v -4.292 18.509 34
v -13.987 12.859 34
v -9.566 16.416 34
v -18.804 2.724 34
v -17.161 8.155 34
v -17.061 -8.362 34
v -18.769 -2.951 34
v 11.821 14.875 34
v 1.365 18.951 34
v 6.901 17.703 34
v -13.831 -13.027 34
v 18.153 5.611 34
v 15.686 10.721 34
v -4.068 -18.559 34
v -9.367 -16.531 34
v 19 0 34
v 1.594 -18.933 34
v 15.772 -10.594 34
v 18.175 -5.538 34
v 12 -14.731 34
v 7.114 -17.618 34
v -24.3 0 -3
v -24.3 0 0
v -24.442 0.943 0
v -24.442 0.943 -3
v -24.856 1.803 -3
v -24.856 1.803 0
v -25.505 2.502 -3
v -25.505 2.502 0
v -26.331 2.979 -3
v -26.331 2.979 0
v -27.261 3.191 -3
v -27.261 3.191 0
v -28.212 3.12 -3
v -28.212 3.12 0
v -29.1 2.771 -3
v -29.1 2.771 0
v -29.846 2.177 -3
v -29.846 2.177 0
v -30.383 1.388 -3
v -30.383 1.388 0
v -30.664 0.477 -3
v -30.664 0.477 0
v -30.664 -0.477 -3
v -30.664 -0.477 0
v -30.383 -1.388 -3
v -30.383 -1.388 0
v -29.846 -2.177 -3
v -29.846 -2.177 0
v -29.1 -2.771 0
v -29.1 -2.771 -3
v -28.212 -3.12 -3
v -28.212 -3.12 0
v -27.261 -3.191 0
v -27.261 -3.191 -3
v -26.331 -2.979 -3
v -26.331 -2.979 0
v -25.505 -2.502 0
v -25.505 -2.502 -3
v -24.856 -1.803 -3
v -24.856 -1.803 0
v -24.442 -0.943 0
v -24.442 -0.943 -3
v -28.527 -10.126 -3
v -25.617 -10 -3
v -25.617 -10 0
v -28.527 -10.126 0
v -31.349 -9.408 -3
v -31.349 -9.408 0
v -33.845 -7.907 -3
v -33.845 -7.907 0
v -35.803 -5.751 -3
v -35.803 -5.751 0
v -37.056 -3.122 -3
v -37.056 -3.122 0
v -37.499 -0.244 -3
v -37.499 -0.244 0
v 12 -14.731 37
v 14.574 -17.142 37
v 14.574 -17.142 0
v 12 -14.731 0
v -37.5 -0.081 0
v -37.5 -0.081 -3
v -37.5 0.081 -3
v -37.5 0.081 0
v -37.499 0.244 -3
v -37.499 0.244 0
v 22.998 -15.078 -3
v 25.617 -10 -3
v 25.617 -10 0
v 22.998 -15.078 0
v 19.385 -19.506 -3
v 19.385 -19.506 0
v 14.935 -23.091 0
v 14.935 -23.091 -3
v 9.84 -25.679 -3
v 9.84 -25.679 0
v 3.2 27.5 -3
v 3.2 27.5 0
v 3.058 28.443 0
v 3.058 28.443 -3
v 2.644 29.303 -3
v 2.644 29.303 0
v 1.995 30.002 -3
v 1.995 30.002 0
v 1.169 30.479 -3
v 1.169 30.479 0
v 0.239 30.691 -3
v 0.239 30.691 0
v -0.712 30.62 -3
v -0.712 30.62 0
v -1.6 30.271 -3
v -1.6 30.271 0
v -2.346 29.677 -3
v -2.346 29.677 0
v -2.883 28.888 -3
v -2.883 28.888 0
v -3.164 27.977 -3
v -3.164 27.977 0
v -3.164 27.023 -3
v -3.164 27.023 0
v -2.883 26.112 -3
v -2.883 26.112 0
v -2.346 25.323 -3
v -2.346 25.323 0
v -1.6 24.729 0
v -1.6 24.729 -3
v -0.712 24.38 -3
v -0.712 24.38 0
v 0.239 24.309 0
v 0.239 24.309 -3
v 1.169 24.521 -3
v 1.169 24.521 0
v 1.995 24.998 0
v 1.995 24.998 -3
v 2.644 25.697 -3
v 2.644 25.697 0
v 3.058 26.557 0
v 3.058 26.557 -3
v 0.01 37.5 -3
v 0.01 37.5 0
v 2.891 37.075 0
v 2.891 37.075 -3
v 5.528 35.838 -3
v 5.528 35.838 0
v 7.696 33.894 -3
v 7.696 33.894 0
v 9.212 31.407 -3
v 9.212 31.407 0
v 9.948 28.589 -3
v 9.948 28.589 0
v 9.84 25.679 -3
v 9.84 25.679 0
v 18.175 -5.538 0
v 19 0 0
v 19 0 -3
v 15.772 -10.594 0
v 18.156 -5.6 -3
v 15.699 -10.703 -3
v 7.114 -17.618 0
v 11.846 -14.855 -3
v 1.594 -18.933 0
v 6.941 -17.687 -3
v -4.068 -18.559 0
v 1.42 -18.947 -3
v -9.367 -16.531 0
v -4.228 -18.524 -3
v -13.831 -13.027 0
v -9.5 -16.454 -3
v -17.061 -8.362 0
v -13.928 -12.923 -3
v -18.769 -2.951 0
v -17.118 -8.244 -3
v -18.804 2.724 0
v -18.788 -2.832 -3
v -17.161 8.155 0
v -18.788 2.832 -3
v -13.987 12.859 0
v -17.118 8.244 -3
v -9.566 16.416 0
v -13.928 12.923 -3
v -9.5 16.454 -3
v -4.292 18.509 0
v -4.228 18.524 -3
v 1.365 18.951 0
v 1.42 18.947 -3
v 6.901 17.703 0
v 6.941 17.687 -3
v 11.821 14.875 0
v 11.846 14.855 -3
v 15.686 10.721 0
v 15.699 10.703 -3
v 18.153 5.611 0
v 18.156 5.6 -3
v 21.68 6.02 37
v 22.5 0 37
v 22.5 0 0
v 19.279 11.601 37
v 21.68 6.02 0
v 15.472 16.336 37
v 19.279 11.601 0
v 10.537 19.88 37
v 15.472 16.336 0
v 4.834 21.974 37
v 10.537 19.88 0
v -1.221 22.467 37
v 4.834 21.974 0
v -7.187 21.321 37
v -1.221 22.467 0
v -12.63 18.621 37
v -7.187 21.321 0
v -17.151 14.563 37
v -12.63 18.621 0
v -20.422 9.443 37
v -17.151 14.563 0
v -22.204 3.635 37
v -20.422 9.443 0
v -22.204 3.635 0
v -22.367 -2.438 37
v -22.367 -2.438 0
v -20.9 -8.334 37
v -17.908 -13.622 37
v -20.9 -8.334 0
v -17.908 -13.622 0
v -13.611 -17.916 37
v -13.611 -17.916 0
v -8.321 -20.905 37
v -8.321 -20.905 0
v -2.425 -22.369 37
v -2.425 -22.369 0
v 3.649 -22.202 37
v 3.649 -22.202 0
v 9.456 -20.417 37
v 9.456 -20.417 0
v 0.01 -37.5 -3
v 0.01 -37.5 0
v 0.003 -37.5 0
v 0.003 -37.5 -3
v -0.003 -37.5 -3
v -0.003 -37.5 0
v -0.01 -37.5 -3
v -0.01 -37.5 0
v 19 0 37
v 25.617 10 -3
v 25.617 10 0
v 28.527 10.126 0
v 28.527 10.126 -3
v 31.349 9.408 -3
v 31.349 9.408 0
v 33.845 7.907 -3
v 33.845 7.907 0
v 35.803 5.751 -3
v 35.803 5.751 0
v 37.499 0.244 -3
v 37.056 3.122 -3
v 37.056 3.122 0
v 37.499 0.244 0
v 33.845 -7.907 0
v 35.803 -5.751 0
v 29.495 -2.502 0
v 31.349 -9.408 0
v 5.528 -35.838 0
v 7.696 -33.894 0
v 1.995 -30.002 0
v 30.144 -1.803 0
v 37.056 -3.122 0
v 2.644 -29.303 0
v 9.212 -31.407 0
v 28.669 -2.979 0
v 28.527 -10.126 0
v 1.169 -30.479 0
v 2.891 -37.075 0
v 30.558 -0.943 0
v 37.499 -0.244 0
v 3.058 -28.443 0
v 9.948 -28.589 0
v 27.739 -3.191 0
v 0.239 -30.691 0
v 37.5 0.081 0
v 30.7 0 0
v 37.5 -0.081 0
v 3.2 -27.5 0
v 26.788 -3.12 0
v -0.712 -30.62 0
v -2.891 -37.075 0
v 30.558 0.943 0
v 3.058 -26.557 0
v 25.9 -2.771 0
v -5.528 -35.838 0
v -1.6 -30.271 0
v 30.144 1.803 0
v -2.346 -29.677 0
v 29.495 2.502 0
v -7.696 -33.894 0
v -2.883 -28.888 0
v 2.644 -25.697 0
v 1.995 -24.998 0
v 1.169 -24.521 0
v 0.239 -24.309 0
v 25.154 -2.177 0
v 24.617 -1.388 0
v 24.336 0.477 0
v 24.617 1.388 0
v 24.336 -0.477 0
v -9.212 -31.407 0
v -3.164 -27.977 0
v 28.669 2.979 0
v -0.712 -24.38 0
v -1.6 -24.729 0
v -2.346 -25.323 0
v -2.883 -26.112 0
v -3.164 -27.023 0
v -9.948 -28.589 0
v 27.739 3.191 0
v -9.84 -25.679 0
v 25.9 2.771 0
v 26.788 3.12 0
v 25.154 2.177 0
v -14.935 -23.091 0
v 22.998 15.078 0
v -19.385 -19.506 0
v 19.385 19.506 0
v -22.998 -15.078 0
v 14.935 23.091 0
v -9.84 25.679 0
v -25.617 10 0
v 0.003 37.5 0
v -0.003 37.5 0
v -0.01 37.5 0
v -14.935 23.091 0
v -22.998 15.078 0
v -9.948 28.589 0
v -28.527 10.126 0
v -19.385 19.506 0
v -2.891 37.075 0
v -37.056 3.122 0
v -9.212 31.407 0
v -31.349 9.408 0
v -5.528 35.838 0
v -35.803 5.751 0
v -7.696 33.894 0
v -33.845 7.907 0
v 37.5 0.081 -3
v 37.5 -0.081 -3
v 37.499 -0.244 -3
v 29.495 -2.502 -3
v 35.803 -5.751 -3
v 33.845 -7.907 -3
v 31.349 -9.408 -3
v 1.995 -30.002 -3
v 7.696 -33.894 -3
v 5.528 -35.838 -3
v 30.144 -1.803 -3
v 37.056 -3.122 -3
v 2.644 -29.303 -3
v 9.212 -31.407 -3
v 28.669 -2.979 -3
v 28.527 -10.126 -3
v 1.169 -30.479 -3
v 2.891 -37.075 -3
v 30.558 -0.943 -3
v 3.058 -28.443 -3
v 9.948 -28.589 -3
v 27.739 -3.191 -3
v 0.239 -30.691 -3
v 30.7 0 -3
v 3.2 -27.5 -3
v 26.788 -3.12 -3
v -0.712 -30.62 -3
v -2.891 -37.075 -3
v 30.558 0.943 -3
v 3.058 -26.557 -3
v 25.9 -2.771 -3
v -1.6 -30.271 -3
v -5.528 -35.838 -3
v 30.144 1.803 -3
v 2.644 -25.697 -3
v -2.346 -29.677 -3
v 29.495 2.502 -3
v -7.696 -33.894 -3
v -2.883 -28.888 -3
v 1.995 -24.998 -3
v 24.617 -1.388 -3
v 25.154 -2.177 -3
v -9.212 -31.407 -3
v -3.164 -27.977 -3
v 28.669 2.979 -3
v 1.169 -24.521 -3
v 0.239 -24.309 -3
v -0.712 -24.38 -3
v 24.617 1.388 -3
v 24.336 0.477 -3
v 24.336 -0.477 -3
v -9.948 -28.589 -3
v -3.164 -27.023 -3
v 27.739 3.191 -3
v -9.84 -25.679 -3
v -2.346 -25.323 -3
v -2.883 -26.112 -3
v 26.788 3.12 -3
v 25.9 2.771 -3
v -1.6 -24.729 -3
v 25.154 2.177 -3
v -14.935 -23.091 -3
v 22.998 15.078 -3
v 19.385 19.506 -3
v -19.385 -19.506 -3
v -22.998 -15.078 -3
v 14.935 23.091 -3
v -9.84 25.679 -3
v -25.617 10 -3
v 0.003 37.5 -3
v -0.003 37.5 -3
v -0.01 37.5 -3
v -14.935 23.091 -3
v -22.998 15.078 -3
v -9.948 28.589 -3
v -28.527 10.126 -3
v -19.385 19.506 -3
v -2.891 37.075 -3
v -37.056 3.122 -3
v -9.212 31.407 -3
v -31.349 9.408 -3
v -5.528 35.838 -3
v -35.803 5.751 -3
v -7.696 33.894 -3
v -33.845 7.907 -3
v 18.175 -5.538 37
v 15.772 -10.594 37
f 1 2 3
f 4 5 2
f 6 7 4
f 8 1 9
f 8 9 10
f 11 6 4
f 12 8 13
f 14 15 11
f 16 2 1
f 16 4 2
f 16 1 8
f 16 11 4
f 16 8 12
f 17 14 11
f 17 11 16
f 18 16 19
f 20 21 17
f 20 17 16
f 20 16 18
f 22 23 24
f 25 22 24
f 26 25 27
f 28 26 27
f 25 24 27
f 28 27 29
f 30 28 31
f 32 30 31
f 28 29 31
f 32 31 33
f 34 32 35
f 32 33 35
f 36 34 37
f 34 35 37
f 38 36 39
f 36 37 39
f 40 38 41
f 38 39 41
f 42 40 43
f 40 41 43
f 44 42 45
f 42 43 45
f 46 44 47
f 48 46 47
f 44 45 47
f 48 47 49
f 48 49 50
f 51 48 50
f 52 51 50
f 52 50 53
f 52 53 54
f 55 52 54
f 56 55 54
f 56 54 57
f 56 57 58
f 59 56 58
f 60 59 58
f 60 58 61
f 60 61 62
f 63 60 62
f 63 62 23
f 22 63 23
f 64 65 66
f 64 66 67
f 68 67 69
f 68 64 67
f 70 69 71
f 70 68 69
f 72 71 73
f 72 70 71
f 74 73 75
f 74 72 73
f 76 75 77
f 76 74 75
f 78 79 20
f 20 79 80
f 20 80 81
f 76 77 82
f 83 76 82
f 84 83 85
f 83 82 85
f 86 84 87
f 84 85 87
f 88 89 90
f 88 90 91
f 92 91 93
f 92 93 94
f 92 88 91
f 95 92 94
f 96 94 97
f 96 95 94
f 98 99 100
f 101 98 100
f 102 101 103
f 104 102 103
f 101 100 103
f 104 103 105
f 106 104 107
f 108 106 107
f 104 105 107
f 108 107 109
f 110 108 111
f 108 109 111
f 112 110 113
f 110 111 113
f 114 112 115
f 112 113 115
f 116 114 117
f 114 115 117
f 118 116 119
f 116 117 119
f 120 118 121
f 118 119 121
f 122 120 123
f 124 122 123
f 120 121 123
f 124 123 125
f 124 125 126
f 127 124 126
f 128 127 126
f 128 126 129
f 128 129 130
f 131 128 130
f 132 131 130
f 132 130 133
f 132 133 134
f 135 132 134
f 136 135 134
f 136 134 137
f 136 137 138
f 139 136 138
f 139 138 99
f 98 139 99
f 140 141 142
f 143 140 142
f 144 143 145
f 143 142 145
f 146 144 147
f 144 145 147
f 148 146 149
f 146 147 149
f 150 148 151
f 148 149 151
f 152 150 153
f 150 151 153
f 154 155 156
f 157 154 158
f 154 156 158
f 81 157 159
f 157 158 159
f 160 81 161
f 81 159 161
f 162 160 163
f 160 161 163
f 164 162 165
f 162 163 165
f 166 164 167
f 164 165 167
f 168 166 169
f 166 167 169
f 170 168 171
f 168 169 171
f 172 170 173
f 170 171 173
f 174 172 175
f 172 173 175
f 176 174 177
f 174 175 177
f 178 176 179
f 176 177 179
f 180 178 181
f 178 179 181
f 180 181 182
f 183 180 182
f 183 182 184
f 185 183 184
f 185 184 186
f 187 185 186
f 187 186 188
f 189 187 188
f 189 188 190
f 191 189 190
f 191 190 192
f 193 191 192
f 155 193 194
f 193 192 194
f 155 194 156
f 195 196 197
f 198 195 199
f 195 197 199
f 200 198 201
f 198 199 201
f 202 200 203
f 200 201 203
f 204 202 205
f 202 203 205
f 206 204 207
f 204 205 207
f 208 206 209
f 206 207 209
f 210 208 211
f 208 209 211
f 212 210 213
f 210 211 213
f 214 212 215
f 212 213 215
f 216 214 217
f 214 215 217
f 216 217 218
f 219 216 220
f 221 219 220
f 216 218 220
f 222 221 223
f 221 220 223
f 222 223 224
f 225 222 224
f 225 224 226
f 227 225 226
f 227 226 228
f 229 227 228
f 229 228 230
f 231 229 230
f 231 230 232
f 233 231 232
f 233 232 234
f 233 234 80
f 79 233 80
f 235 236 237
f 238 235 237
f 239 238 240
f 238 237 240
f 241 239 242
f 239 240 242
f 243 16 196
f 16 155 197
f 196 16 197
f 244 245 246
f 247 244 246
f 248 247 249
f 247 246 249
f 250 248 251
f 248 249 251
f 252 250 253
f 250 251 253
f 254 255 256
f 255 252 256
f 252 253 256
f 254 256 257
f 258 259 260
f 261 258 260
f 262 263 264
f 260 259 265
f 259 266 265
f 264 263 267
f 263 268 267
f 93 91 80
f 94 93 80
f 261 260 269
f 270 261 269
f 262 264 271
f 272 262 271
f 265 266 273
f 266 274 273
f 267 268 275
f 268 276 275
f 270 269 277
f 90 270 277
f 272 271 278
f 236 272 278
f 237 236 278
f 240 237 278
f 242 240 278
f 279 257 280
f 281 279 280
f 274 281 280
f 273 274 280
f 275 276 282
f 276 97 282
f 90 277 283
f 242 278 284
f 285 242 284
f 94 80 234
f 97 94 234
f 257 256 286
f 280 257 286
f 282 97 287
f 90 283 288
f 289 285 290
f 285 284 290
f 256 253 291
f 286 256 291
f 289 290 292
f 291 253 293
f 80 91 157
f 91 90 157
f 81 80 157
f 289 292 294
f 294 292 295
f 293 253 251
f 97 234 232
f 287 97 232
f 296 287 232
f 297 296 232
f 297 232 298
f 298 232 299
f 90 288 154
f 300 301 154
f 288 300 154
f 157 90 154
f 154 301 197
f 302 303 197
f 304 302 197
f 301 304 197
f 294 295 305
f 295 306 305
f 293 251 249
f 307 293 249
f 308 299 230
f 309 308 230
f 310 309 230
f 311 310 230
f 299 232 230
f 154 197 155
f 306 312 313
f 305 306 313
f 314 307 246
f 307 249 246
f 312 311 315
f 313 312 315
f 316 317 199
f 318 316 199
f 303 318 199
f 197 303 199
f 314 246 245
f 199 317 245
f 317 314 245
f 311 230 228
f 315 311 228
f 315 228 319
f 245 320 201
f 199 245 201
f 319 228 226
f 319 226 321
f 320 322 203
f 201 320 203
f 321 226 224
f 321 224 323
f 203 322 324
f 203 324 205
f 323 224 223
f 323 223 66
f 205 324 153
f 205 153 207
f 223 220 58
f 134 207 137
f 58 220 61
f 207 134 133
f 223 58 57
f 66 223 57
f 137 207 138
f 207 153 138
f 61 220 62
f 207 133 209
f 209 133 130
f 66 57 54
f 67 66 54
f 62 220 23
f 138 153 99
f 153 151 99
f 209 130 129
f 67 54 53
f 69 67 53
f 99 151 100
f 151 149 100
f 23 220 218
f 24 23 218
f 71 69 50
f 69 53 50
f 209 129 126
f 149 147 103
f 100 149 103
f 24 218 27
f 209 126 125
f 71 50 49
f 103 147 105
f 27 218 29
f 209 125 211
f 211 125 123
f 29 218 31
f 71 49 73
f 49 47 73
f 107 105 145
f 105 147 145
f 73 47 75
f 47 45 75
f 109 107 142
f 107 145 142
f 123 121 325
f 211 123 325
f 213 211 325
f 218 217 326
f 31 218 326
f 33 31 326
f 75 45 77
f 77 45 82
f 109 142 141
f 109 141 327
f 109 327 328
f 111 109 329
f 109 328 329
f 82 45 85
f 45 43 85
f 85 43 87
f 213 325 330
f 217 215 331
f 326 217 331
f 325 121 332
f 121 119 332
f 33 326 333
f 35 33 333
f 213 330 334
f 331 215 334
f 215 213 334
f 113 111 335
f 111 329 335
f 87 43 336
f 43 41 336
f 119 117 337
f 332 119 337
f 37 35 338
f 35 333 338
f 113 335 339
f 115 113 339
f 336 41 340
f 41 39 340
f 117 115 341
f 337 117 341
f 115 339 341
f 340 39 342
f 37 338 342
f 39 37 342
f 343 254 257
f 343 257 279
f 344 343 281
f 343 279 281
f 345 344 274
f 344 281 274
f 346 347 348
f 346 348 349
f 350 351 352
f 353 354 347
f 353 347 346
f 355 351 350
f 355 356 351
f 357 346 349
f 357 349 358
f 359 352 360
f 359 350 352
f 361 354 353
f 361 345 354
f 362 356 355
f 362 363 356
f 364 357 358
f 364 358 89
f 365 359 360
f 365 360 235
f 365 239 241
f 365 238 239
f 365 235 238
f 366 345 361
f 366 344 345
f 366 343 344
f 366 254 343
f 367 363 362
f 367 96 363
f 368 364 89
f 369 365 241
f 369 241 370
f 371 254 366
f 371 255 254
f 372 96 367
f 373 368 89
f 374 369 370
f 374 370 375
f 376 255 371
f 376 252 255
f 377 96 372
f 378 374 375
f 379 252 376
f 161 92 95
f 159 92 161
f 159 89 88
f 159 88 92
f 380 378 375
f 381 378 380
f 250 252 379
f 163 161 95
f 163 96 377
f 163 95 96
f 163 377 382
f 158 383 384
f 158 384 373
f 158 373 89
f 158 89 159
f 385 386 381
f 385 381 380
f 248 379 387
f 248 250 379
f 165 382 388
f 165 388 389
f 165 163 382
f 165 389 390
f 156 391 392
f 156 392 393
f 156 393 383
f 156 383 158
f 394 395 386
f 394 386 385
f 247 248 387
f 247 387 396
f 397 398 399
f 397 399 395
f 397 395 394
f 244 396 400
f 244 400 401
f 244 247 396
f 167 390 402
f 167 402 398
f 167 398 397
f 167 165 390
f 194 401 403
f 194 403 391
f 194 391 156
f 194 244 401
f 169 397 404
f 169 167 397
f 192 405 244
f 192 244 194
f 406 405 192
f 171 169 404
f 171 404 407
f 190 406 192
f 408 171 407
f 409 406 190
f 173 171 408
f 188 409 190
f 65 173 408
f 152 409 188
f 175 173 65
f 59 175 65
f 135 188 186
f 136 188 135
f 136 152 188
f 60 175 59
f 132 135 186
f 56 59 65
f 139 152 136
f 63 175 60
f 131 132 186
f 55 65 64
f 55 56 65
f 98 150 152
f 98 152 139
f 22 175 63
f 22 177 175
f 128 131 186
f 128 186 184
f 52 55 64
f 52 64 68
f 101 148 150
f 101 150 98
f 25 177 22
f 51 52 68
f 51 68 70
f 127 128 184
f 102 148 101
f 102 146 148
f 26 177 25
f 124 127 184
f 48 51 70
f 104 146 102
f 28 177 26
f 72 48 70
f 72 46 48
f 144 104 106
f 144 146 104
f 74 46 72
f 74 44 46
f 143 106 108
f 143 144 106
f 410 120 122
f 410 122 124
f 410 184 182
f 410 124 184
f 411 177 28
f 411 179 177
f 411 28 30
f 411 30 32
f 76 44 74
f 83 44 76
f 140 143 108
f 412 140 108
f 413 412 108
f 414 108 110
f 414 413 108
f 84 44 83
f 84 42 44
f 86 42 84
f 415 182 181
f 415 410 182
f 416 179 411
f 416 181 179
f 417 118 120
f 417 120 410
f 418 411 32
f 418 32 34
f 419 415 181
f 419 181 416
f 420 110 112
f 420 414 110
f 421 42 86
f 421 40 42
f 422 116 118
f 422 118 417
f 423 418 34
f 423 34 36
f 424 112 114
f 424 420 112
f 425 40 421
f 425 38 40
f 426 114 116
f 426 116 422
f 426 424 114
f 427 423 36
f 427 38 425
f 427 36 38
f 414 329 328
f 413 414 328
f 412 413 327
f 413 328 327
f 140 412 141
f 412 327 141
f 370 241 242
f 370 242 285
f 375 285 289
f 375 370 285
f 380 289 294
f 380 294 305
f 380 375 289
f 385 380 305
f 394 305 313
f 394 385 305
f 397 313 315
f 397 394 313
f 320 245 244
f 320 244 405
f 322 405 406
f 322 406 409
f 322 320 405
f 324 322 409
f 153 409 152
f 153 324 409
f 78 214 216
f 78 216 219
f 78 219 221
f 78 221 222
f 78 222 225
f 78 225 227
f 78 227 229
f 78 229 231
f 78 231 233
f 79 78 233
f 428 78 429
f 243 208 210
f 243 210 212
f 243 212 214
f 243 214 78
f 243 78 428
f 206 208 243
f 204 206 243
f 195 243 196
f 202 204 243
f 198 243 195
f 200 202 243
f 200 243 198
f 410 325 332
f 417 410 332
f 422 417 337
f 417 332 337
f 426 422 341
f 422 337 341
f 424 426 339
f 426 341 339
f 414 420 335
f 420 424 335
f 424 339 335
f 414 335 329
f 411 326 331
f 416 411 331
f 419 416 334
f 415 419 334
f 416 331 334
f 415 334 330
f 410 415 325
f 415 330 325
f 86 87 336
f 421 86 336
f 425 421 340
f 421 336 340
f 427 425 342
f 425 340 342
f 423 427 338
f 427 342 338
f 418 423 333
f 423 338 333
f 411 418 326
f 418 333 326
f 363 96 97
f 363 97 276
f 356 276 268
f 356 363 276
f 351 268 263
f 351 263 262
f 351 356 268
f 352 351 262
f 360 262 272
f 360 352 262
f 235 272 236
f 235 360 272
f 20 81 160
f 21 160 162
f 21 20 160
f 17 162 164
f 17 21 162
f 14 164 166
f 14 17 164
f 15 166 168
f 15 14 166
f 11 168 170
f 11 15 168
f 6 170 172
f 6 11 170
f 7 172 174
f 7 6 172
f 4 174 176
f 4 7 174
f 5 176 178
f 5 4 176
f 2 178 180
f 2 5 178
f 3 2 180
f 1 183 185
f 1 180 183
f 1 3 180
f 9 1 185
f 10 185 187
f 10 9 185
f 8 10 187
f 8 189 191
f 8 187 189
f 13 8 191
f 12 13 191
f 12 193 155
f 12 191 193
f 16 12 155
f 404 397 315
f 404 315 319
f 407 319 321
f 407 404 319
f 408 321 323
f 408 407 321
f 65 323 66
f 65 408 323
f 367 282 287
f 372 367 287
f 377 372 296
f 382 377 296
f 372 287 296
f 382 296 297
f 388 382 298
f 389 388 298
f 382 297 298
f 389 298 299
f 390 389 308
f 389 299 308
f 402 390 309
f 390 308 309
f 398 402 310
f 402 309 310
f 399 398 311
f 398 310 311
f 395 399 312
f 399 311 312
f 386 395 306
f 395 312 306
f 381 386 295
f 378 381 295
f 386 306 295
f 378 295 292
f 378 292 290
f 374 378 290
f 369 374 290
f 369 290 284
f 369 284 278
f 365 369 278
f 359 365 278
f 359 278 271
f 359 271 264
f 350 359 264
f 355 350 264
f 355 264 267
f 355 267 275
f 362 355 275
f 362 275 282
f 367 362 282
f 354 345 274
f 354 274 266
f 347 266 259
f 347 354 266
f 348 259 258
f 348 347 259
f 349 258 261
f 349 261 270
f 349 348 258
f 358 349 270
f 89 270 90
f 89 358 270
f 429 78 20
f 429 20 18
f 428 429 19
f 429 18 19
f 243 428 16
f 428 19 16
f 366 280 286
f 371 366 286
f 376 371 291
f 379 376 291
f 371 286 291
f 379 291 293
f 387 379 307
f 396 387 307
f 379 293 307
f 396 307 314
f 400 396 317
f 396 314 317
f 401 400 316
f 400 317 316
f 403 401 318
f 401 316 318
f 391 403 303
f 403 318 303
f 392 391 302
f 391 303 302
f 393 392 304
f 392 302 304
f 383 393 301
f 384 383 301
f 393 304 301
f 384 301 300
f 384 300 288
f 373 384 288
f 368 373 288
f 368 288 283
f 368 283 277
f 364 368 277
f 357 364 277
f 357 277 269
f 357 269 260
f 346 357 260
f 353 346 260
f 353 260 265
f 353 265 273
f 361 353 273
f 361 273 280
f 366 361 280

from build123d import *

# Parameters (mm, degrees)
ESQUISSE1_R                  = 22.5
BOSS_EXTRU_1_DEPTH           = 37
ENL_V_MAT_EXTRU_1_DEPTH      = 3
ENL_V_MAT_EXTRU_1_DEPTH_BACK = 34
ESQUISSE4_R                  = 19
ENL_V_MAT_EXTRU_3_DEPTH      = 49.80061475
ESQUISSE9_R                  = 37.5
BOSS_EXTRU_2_DEPTH           = 3
ENL_V_START                  = 3
ESQUISSE4_2_R                = 19
ENL_V_MAT_EXTRU_4_DEPTH      = 3
D_GAGEMENT_M61_D             = 6.4
ENL_V_START_2                = -3
ENL_V_MAT_EXTRU_5_DEPTH      = 3
CONG_1_R                     = 10
CONG_1_OF_SYM_TRIE4_R        = 10
SYM_TRIE5_START              = -3
SYM_TRIE5_DEPTH              = 3


# Read off the part's stored shape, not the designer's step: Symétrie5
with BuildPart() as part:
    # Esquisse1 → Boss.-Extru.1 (new body)
    with BuildSketch(Plane.XY):
        Circle(ESQUISSE1_R)
    extrude(amount=BOSS_EXTRU_1_DEPTH)

    # Esquisse4 → Enlèv. mat.-Extru.1 (cut, two sides: drawn at the far end of the back side and taken through both)
    with BuildSketch(Plane(origin=(0, 0, 0), x_dir=(-1, 0, 0), z_dir=(0, 0, -1)).offset(-ENL_V_MAT_EXTRU_1_DEPTH_BACK)):
        with Locations(Location((0, 0, 0), (0, 0, 180))):
            Circle(ESQUISSE4_R)
    extrude(amount=ENL_V_MAT_EXTRU_1_DEPTH + ENL_V_MAT_EXTRU_1_DEPTH_BACK, mode=Mode.SUBTRACT)

    # Esquisse7 → Enlèv. mat.-Extru.3 (cut, through all)
    with BuildSketch(Plane(origin=(0, 0, 0), x_dir=(-1, 0, 0), z_dir=(0, 0, -1))):
        with BuildLine():
            Line((-14.573529274, -17.142410697), (-11.999578126, -14.731263517))
            ThreePointArc((-11.999578126, -14.731263517), (-17.160885531, -8.154998946), (-19, 0))
            Line((-19, 0), (-22.5, 0))
            ThreePointArc((-22.5, 0), (-20.422468125, -9.443134843), (-14.573529274, -17.142410697))
        make_face()
    extrude(amount=-ENL_V_MAT_EXTRU_3_DEPTH, mode=Mode.SUBTRACT)

    # Esquisse9 → Boss.-Extru.2 (add)
    with BuildSketch(Plane(origin=(0, 0, 0), x_dir=(-1, 0, 0), z_dir=(0, 0, -1))):
        Circle(ESQUISSE9_R)
    extrude(amount=BOSS_EXTRU_2_DEPTH)

    # Esquisse4<2> → Enlèv. mat.-Extru.4 (cut)
    with BuildSketch(Plane(origin=(0, 0, 0), x_dir=(-1, 0, 0), z_dir=(0, 0, -1)).offset(ENL_V_START)):
        with Locations(Location((0, 0, 0), (0, 0, 180))):
            Circle(ESQUISSE4_2_R)
    extrude(amount=-ENL_V_MAT_EXTRU_4_DEPTH, mode=Mode.SUBTRACT)

    # Dégagement M61 (through all)
    with Locations(Plane(origin=(0, 0, -3), x_dir=(-1, 0, 0), z_dir=(0, 0, -1))):
        with Locations((0, 27.5), (27.5, 0), (0, -27.5), (-27.5, 0)):
            Hole(D_GAGEMENT_M61_D / 2)

    # Esquisse15 → Enlèv. mat.-Extru.5 (cut)
    with BuildSketch(Plane(origin=(0, 0, -3), x_dir=(-1, 0, 0), z_dir=(0, 0, -1)).offset(ENL_V_START_2)):
        with BuildLine():
            Line((34.932786702, 13.636363636), (25.617376915, 10))
            ThreePointArc((25.617376915, 10), (19.384796538, 19.505887911), (9.840281362, 25.679152297))
            Line((9.840281362, 25.679152297), (12.051640076, 35.51067405))
            ThreePointArc((12.051640076, 35.51067405), (25.913422274, 27.106171734), (34.932786702, 13.636363636))
        make_face()
    enl_v_mat_extru_5 = extrude(amount=ENL_V_MAT_EXTRU_5_DEPTH, mode=Mode.SUBTRACT)

    # Congé1
    # the kernel refuses this fillet: 10 mm, written as the material it takes off along each edge
    with BuildSketch(Plane(origin=(-12.051640076, 35.51067405, 30.511737931), x_dir=(0.9866266204606564, 0.16299666192405335, 0), z_dir=(0, 0, -1))) as cong_1_piece_1:
        with BuildLine():
            CenterArc((10.577402483, 9.866707582), CONG_1_R, 178.889666711, 100.475681696)
            Line((0.579280147, 10.060485169), (0.3793177, 10.064360721))
            ThreePointArc((0.3793177, 10.064360721), (0.089970794, 5.04173949), (-0.199669279, 0.011496906))
            Line((-0.199669279, 0.011496906), (-0.032545854, -0.197334152))
            ThreePointArc((-0.032545854, -0.197334152), (6.102347586, -0.699846569), (12.237241026, -0.197334152))
            Line((12.237241026, -0.197334152), (12.204695172, 0))
        make_face()
    extrude(amount=64.023475862, mode=Mode.SUBTRACT)
    with BuildSketch(Plane(origin=(-34.932786702, 13.636363636, 34.090909091), x_dir=(-0.18820424606330075, -0.9821299108385533, 0), z_dir=(0, 0, -1))) as cong_1_piece_2:
        with BuildLine():
            CenterArc((11.818181818, -9.83332166), CONG_1_R, 79.524318304, 100.475681696)
            Line((1.818181818, -9.83332166), (1.618181818, -9.83332166))
            ThreePointArc((1.618181818, -9.83332166), (0.712424476, -4.953024467), (-0.196666433, -0.036363636))
            Line((-0.196666433, -0.036363636), (-0.036363636, 0.196666433))
            ThreePointArc((-0.036363636, 0.196666433), (6.818181818, 0.825043774), (13.672727273, 0.196666433))
            Line((13.672727273, 0.196666433), (13.636363636, 0))
        make_face()
    extrude(amount=71.181818182, mode=Mode.SUBTRACT)

    # Symétrie4: Enlèv. mat.-Extru.5 across plane
    add(enl_v_mat_extru_5.mirror(Plane(origin=(0, 0, 0), x_dir=(0, 0, 1), z_dir=(1, 0, 0))), mode=Mode.SUBTRACT)

    # Congé1 of Symétrie4
    # the kernel refuses this fillet: 10 mm, written as the material it takes off along each edge
    with BuildSketch(Plane(origin=(12.051640076, 35.51067405, 30.511737931), x_dir=(-0.9866266204606562, 0.1629966619240532, 0), z_dir=(0, 0, -1))) as cong_1_of_sym_trie4_piece_1:
        with BuildLine():
            CenterArc((10.577402483, -9.866707582), CONG_1_OF_SYM_TRIE4_R, 80.634651593, 100.475681696)
            Line((0.579280147, -10.060485169), (0.3793177, -10.064360721))
            ThreePointArc((0.3793177, -10.064360721), (0.089970794, -5.04173949), (-0.199669279, -0.011496906))
            Line((-0.199669279, -0.011496906), (-0.032545854, 0.197334152))
            ThreePointArc((-0.032545854, 0.197334152), (6.102347586, 0.699846569), (12.237241026, 0.197334152))
            Line((12.237241026, 0.197334152), (12.204695172, 0))
        make_face()
    extrude(amount=64.023475862, mode=Mode.SUBTRACT)
    with BuildSketch(Plane(origin=(34.932786702, 13.636363636, 34.090909091), x_dir=(0.18820424606330144, -0.982129910838553, 0), z_dir=(0, 0, -1))) as cong_1_of_sym_trie4_piece_2:
        with BuildLine():
            CenterArc((11.818181818, 9.83332166), CONG_1_OF_SYM_TRIE4_R, 180, 100.475681696)
            Line((1.818181818, 9.83332166), (1.618181818, 9.83332166))
            ThreePointArc((1.618181818, 9.83332166), (0.712424476, 4.953024467), (-0.196666433, 0.036363636))
            Line((-0.196666433, 0.036363636), (-0.036363636, -0.196666433))
            ThreePointArc((-0.036363636, -0.196666433), (6.818181818, -0.825043774), (13.672727273, -0.196666433))
            Line((13.672727273, -0.196666433), (13.636363636, 0))
        make_face()
    extrude(amount=71.181818182, mode=Mode.SUBTRACT)

    # Symétrie5 outline → Symétrie5 (cut)
    with BuildSketch(Plane.XY.offset(SYM_TRIE5_START)):
        with BuildLine():
            ThreePointArc((-0.010162924, -37.499998623), (-7.696247071, -33.893936965), (-9.840281362, -25.679152297))
            ThreePointArc((-9.840281362, -25.679152297), (-19.384796538, -19.505887911), (-25.617376915, -10))
            ThreePointArc((-25.617376915, -10), (-33.845353653, -7.907162456), (-37.499208239, -0.243683034))
            ThreePointArc((-37.499208239, -0.243683034), (-26.433813461, -26.59893806), (-0.010162924, -37.499998623))
        make_face()
        with BuildLine():
            ThreePointArc((9.840281362, -25.679152297), (7.696247071, -33.893936965), (0.010162924, -37.499998623))
            ThreePointArc((0.010162924, -37.499998623), (26.433813461, -26.59893806), (37.499208239, -0.243683034))
            ThreePointArc((37.499208239, -0.243683034), (33.845353653, -7.907162456), (25.617376915, -10))
            ThreePointArc((25.617376915, -10), (19.384796538, -19.505887911), (9.840281362, -25.679152297))
        make_face()
    extrude(amount=SYM_TRIE5_DEPTH, mode=Mode.SUBTRACT)


solid = part.part
